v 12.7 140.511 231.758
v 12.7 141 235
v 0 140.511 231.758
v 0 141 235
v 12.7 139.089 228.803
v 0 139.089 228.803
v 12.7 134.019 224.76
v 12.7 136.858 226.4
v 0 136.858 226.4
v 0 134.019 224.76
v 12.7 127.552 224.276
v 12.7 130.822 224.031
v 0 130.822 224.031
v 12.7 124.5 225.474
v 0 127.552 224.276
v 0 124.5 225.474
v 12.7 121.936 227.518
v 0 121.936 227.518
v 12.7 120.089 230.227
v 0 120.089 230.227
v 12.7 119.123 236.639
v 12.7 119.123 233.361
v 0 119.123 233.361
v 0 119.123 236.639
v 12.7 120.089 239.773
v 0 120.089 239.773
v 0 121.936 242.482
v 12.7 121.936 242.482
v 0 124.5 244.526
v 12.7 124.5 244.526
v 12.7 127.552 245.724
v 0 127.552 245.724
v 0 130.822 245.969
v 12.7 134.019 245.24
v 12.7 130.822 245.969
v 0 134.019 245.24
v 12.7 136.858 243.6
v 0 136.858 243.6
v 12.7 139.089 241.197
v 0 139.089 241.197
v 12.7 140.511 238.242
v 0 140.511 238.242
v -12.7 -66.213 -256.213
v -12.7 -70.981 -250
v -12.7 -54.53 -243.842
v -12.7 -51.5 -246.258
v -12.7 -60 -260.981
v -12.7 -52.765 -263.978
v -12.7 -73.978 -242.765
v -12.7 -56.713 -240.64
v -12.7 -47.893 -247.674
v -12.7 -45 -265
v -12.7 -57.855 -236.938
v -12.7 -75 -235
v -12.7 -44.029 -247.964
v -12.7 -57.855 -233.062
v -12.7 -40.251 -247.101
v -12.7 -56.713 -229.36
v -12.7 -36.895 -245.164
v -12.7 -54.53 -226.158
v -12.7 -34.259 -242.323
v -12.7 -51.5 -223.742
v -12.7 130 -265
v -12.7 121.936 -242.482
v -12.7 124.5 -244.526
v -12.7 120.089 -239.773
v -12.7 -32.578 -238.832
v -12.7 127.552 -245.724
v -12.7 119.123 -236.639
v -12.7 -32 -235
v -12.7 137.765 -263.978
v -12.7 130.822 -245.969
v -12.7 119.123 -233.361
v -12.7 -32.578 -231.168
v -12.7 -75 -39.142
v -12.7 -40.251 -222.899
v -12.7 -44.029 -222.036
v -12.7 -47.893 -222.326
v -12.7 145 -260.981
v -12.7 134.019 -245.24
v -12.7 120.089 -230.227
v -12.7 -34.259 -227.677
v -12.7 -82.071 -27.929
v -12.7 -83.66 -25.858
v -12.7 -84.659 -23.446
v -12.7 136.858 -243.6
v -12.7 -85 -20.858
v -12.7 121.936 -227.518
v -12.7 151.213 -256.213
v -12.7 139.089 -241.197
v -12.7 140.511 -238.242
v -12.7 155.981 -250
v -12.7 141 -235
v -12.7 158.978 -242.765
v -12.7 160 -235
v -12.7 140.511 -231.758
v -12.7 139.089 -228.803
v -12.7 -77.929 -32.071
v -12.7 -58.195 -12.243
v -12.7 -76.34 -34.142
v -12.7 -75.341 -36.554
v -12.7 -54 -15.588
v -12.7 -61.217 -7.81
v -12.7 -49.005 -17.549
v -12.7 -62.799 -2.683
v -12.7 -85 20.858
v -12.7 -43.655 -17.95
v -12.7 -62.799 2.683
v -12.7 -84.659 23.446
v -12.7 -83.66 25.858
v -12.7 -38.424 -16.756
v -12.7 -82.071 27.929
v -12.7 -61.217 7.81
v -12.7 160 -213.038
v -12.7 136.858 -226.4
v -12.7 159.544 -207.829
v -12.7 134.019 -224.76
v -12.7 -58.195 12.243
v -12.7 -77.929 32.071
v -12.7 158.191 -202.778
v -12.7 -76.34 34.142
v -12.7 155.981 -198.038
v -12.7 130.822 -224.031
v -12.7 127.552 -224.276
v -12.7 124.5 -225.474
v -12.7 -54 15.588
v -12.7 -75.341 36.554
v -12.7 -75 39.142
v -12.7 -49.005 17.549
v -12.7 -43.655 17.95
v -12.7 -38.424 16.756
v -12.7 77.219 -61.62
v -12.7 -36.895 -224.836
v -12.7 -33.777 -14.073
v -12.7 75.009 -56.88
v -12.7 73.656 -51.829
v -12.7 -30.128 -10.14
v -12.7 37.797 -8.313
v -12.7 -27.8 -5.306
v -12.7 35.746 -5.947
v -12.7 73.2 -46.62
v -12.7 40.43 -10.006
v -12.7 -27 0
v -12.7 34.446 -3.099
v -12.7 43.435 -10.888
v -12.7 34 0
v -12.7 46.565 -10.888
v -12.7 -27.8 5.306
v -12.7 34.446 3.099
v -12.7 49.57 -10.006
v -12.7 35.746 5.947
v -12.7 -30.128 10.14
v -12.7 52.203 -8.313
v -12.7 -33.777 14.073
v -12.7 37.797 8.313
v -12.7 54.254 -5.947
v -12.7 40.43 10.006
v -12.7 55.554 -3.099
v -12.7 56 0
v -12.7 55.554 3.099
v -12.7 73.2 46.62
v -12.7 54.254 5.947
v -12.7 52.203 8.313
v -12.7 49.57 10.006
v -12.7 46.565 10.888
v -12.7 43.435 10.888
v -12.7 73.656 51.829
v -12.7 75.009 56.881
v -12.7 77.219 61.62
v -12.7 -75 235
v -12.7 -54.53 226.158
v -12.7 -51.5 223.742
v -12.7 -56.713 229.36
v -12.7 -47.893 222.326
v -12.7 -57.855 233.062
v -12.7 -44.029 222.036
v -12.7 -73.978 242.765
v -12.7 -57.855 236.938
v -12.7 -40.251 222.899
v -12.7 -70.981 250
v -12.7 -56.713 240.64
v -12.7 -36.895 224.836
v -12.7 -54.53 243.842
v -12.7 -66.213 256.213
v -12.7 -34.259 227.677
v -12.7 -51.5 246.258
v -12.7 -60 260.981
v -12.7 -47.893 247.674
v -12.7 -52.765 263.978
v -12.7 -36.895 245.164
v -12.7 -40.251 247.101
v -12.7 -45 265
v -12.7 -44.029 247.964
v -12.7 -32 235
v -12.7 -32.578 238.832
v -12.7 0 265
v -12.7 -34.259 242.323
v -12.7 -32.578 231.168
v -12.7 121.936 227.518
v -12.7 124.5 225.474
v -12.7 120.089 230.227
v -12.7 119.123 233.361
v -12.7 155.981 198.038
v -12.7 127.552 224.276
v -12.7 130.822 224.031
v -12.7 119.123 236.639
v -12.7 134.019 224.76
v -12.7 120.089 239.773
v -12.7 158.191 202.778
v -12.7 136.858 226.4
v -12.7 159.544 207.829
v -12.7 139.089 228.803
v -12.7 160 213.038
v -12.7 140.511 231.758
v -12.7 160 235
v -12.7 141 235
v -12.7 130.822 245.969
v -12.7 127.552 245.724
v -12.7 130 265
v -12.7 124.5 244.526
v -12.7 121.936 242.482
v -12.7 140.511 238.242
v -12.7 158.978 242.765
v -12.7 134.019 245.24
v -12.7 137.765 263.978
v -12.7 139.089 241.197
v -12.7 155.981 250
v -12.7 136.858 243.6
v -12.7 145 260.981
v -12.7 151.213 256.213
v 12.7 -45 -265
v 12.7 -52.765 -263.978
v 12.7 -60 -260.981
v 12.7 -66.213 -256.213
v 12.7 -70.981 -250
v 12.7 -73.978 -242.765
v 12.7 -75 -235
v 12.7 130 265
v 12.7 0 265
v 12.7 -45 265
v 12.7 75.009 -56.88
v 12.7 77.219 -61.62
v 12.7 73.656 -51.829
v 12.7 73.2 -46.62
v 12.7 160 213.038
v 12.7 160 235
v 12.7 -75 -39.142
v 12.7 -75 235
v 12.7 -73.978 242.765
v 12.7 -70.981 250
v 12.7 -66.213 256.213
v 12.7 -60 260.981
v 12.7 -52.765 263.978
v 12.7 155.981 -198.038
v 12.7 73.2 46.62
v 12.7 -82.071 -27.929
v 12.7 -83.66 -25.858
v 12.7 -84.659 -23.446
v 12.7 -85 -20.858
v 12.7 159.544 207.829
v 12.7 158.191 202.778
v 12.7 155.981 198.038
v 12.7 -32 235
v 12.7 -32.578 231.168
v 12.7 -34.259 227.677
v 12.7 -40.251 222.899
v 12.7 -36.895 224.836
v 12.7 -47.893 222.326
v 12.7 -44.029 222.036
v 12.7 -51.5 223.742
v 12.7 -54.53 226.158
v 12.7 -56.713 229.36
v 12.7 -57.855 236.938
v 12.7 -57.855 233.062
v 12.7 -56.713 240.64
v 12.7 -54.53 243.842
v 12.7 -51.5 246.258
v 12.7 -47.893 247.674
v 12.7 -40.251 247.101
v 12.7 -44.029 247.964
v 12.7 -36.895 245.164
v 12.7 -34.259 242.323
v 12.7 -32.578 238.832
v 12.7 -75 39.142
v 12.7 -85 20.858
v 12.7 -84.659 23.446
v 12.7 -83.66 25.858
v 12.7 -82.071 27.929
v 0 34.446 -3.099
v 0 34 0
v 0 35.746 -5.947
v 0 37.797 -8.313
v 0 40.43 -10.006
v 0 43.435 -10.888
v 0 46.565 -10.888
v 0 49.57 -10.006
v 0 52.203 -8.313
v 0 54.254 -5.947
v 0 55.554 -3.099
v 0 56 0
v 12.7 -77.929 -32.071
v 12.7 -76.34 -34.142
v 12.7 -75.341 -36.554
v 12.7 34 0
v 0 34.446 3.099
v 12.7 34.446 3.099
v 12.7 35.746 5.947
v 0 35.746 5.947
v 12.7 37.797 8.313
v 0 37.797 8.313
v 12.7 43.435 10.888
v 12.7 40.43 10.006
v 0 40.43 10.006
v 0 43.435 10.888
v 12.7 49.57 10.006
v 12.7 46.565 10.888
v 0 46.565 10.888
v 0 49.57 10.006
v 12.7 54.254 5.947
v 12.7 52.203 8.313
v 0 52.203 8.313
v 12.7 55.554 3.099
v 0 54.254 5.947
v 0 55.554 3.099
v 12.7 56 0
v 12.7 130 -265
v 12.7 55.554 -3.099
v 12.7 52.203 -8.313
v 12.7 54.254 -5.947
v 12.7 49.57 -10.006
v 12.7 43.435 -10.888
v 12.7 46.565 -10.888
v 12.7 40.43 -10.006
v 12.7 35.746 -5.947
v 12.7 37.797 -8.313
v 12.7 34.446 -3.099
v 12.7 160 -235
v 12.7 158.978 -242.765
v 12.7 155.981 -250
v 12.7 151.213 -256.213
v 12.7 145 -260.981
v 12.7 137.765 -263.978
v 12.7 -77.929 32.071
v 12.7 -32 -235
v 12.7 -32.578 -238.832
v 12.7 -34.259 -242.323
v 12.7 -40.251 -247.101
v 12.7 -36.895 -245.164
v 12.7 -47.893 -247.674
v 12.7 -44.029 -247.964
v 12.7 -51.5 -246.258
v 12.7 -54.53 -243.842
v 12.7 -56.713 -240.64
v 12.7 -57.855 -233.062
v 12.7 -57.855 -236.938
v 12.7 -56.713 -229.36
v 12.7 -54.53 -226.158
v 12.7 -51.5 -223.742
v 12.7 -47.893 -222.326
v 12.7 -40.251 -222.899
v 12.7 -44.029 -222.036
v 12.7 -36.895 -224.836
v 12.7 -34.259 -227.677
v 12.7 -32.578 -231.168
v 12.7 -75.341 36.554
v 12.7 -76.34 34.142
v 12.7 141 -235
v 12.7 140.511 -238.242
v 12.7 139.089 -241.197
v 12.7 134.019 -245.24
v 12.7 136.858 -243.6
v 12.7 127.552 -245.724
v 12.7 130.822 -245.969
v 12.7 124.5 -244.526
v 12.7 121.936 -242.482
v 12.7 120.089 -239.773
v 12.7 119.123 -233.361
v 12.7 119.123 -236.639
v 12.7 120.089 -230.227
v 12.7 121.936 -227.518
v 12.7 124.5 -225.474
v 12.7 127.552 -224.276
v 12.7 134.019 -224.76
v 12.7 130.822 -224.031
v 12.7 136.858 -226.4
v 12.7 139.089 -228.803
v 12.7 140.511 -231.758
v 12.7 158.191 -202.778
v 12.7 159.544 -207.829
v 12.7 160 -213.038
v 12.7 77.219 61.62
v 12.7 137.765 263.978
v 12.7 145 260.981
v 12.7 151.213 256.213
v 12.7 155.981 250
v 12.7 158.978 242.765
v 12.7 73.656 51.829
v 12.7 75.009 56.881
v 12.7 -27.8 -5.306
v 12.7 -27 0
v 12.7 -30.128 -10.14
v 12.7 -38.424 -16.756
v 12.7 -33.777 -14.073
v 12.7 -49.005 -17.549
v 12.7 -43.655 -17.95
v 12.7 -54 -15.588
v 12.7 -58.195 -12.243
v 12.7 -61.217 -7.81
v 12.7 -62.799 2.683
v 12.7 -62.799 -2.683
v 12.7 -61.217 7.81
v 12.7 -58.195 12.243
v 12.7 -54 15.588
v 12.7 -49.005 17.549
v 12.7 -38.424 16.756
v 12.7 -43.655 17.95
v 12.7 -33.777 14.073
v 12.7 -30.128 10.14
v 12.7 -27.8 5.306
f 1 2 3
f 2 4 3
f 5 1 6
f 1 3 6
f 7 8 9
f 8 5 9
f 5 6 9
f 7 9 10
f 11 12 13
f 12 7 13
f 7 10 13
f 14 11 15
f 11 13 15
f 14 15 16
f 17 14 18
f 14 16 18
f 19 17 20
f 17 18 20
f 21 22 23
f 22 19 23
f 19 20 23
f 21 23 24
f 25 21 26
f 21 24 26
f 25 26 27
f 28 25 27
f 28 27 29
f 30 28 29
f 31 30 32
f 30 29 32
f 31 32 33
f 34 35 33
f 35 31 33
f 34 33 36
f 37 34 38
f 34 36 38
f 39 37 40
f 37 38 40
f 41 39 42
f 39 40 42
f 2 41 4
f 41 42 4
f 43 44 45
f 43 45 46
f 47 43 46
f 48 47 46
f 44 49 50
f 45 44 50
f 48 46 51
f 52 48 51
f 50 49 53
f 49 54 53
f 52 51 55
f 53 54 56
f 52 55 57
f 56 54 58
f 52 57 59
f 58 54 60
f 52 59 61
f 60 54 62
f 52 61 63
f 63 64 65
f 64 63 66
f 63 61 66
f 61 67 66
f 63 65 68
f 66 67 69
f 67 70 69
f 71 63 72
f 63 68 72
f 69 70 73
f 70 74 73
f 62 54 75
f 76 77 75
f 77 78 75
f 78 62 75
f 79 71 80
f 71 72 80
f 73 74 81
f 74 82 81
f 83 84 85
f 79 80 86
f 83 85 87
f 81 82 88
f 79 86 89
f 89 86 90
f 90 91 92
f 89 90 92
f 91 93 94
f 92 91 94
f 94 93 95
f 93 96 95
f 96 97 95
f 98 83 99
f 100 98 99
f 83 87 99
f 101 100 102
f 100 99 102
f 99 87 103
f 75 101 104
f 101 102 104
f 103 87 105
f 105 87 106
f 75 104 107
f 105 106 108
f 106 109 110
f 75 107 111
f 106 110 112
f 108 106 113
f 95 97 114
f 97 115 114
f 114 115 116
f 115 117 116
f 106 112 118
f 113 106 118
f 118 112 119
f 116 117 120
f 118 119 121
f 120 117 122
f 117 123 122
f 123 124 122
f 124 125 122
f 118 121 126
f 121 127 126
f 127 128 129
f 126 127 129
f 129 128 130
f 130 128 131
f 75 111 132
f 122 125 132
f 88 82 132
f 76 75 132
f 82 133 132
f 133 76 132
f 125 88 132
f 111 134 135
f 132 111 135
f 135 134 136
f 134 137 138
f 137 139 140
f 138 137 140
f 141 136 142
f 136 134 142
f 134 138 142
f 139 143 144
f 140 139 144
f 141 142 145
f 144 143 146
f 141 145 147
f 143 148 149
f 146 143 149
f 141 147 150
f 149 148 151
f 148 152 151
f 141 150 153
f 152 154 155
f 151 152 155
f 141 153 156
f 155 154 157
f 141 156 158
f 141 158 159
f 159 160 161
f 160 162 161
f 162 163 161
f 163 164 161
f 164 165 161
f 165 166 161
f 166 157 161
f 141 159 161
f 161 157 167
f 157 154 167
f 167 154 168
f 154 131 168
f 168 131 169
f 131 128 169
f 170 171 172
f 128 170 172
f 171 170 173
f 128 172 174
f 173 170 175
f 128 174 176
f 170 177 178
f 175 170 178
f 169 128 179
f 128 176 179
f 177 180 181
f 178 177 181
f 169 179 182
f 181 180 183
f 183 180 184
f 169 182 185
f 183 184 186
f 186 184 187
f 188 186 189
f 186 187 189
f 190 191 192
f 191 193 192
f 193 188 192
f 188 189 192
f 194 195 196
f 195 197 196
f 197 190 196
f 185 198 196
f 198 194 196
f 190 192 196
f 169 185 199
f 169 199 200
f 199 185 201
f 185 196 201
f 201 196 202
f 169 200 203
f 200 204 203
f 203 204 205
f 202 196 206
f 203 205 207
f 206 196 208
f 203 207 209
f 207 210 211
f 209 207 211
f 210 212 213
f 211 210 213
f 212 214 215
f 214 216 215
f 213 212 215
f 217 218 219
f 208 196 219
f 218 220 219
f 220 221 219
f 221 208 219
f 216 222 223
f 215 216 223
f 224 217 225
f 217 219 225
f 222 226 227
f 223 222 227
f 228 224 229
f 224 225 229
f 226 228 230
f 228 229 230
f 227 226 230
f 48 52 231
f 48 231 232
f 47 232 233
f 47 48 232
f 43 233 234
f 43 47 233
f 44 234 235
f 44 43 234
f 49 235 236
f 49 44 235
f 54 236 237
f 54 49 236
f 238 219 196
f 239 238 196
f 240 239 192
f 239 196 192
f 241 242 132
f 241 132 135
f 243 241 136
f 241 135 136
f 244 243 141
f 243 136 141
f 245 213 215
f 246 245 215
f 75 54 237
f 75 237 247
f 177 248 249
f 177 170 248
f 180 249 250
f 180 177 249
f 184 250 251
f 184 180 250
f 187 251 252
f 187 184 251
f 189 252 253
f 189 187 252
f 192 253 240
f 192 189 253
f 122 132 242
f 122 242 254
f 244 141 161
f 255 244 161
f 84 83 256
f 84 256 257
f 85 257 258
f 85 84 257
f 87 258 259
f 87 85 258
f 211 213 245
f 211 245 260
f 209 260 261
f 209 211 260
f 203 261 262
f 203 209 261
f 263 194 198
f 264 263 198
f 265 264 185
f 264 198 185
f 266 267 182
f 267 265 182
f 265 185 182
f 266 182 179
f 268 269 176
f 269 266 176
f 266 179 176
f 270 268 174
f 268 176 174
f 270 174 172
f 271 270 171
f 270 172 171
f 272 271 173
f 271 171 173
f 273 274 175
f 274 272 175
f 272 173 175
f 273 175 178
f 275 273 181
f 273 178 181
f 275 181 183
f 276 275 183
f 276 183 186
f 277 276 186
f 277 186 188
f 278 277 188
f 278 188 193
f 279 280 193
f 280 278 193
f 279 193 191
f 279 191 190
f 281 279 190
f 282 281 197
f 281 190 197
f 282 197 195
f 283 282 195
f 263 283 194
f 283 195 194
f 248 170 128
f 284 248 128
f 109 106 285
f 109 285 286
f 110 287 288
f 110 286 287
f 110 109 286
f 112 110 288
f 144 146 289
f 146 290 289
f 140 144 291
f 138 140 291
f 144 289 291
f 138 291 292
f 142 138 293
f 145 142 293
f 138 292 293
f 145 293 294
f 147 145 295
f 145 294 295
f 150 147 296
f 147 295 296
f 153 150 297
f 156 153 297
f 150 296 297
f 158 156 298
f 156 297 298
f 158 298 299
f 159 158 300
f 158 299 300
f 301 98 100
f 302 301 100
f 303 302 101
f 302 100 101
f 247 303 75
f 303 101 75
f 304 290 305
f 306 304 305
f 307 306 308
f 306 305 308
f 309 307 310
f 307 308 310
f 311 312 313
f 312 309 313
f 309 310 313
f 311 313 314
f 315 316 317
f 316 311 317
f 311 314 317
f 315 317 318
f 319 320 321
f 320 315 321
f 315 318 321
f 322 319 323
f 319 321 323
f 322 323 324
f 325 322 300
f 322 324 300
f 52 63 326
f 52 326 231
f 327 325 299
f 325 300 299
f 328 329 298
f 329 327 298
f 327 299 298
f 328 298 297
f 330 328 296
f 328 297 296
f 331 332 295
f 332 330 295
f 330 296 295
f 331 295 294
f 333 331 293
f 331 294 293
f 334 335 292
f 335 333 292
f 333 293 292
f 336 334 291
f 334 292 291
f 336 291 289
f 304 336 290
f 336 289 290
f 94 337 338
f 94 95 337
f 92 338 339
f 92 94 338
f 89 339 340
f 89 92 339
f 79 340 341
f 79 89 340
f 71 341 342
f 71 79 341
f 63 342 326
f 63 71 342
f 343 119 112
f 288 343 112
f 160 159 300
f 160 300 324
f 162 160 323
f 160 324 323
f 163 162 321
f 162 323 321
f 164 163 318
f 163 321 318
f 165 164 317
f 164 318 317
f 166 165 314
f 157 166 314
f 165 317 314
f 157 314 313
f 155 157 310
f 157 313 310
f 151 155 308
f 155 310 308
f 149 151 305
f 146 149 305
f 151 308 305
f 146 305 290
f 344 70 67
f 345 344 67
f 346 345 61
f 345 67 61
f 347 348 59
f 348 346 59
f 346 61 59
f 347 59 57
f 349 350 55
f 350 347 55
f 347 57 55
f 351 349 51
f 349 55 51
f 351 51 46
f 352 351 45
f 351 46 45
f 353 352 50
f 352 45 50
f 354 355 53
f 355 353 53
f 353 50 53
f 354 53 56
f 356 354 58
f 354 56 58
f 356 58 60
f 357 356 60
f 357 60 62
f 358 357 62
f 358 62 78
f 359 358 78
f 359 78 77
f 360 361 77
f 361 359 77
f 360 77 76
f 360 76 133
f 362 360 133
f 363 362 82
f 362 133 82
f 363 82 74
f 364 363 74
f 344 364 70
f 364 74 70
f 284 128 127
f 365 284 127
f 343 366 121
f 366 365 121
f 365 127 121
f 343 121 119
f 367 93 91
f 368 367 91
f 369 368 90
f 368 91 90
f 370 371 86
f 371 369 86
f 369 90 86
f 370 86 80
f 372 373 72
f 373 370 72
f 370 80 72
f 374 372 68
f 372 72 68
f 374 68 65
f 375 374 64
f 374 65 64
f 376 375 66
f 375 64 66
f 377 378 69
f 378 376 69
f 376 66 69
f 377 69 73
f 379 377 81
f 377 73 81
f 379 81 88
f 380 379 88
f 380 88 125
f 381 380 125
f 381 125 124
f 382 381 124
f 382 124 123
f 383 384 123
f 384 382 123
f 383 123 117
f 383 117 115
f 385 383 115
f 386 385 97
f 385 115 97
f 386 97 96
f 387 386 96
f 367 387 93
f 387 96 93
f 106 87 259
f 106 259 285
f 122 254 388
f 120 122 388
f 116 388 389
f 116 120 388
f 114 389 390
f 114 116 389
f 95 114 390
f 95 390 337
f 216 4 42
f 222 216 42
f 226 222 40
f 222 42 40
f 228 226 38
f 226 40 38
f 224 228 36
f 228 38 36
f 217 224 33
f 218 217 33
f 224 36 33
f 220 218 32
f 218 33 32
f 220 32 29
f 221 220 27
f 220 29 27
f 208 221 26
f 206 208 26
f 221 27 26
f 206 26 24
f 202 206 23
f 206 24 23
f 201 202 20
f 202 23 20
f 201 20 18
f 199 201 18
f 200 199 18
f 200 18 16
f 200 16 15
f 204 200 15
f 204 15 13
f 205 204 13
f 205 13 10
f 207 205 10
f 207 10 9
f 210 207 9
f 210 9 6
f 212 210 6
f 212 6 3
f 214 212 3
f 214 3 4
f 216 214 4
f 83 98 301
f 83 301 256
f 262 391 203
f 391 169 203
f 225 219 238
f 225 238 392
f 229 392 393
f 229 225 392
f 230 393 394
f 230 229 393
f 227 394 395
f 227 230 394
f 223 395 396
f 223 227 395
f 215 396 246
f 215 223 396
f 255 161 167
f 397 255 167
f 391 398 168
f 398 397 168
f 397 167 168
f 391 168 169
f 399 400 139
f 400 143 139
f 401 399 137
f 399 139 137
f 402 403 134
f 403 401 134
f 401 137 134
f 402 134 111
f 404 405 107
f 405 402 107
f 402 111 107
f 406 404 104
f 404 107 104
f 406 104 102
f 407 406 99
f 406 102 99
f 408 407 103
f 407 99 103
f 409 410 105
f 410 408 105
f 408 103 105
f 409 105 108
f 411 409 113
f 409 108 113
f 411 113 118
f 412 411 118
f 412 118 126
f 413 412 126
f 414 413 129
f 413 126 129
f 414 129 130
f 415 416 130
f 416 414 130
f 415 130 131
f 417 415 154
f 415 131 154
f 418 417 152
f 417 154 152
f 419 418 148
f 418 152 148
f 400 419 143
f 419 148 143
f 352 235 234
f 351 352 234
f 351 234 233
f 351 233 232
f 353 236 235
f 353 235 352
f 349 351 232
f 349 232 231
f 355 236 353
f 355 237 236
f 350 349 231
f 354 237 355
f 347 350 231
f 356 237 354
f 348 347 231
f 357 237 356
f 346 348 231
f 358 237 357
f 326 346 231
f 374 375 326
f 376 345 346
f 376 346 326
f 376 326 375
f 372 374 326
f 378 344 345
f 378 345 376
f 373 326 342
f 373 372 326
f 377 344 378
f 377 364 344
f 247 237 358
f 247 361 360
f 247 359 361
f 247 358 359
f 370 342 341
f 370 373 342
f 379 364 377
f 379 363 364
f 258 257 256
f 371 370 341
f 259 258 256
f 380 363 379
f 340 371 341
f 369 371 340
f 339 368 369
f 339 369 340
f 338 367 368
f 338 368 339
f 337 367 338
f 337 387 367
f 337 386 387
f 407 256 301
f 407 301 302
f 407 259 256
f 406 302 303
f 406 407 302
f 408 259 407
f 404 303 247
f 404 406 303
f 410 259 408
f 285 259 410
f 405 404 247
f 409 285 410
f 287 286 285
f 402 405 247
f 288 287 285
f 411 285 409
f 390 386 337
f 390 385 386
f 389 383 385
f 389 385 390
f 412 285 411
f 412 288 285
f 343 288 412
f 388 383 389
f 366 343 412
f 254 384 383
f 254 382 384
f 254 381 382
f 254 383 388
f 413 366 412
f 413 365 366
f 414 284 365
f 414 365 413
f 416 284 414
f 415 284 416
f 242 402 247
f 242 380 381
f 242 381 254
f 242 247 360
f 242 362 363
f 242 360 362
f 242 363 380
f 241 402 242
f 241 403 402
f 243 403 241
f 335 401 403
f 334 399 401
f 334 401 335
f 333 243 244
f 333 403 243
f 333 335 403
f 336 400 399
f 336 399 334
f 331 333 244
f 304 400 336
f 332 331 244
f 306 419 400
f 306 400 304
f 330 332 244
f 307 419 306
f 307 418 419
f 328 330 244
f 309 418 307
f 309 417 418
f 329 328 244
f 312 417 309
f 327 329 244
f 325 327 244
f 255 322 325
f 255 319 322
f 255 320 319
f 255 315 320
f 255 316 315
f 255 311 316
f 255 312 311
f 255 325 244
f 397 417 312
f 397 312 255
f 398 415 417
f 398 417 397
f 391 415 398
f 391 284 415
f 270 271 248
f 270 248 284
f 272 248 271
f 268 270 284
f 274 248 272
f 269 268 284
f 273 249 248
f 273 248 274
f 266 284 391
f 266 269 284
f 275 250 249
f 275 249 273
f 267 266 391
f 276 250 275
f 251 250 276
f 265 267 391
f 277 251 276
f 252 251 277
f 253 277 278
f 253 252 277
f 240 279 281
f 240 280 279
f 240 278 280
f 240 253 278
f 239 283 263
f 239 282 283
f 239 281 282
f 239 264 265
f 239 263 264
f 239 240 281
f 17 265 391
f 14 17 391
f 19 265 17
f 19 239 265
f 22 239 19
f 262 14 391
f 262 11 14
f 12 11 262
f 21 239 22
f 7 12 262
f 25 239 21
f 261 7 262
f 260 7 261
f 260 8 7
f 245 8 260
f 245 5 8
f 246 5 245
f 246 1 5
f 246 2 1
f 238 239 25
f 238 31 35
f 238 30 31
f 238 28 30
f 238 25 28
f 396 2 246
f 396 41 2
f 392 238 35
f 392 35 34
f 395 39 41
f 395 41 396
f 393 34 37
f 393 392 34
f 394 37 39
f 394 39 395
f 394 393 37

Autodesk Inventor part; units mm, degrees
ref_plane "YZ Plane" through (0, 0, 0) normal (1, 0, 0) x (0, 1, 0)
ref_plane "XZ Plane" through (0, 0, 0) normal (0, 1, 0) x (-1, 0, 0)
ref_plane "XY Plane" through (0, 0, 0) normal (0, 0, 1) x (1, 0, 0)
sketch "Sketch1" plane through (0, 0, 0) normal (1, 0, 0) x (0, 1, 0)
  circle A0 centre (45, 0) radius 11
  line L0 (45, 0) -> (0, 0)
  circle A1 centre (130, 235) radius 11
  line L1 (73.2002, 0) -> (73.2002, 46.6199)
  line L2 (77.2194, 61.6199) -> (155.9808, 198.0385)
  line L3 (160, 213.0385) -> (160, 235)
  arc A2 (160, 235) -> (130, 265) centre (130, 235) ccw
  line L4 (130, 235) -> (130, 265) construction
  line L5 (130, 235) -> (160, 235) construction
  line L6 (130, 265) -> (-45, 265)
  circle A3 centre (-45, 0) radius 18
  line L7 (0, 0) -> (0, 265)
  circle A4 centre (-45, 235) radius 13
  arc A5 (-45, 265) -> (-75, 235) centre (-45, 235) ccw
  line L8 (-45, 235) -> (-75, 235) construction
  line L9 (-45, 235) -> (-45, 265) construction
  line L10 (-75, 235) -> (-75, 39.1421)
  line L11 (0, 0) -> (-45, 0)
  circle A6 centre (130, -235) radius 11
  line L12 (73.2002, 0) -> (73.2002, -46.6199)
  line L13 (77.2194, -61.6199) -> (155.9808, -198.0385)
  line L14 (160, -213.0385) -> (160, -235)
  arc A7 (130, -265) -> (160, -235) centre (130, -235) ccw
  line L15 (130, -265) -> (-45, -265)
  circle A8 centre (-45, -235) radius 13
  arc A9 (-75, -235) -> (-45, -265) centre (-45, -235) ccw
  line L16 (-45, -235) -> (-75, -235) construction
  line L17 (-75, -235) -> (-75, -39.1421)
  arc A10 (155.9808, 198.0385) -> (160, 213.0385) centre (130, 213.0385) ccw
  arc A11 (77.2194, 61.6199) -> (73.2002, 46.6199) centre (103.2002, 46.6199) ccw
  arc A12 (73.2002, -46.6199) -> (77.2194, -61.6199) centre (103.2002, -46.6199) ccw
  arc A13 (160, -213.0385) -> (155.9808, -198.0385) centre (130, -213.0385) ccw
  line L18 (-77.9289, 32.0711) -> (-82.0711, 27.9289)
  line L19 (-85, 20.8579) -> (-85, 0)
  line L20 (-77.9289, -32.0711) -> (-82.0711, -27.9289)
  line L21 (-85, -20.8579) -> (-85, 0)
  arc A14 (-77.9289, 32.0711) -> (-75, 39.1421) centre (-85, 39.1421) ccw
  arc A15 (-82.0711, 27.9289) -> (-85, 20.8579) centre (-75, 20.8579) ccw
  arc A16 (-85, -20.8579) -> (-82.0711, -27.9289) centre (-75, -20.8579) ccw
  arc A17 (-75, -39.1421) -> (-77.9289, -32.0711) centre (-85, -39.1421) ccw
  point P0 (73.2002, 54.6584)
  point P1 (160, 205)
  point P2 (-75, -35)
  point P3 (48.2002, -10.5242)
  point P4 (73.2002, -54.6584)
  point P5 (160, -205)
  point P6 (-85, 25)
  point P7 (-75, 35)
  point P8 (-85, -25)
  dimension "d0" = 22
  dimension "d1" = 22
  dimension "d2" = 470
  dimension "d3" = 90
  dimension "d4" = 36
  dimension "d7" = 30
  dimension "d8" = 26
  dimension "d9" = 90
  dimension "d11" = 25
  dimension "d12" = 85
  dimension "d13" = 90
  dimension "d14" = 30
  dimension "d15" = 30
  dimension "d16" = 30
  dimension "d19" = 45
  dimension "d20" = 40
  dimension "d21" = 50
  dimension "d22" = 10
extrude "Extrusion1" add sketch "Sketch1" along normal mid plane 25.4
properties part number "Balancim_3-Cabos_Modelo1"
